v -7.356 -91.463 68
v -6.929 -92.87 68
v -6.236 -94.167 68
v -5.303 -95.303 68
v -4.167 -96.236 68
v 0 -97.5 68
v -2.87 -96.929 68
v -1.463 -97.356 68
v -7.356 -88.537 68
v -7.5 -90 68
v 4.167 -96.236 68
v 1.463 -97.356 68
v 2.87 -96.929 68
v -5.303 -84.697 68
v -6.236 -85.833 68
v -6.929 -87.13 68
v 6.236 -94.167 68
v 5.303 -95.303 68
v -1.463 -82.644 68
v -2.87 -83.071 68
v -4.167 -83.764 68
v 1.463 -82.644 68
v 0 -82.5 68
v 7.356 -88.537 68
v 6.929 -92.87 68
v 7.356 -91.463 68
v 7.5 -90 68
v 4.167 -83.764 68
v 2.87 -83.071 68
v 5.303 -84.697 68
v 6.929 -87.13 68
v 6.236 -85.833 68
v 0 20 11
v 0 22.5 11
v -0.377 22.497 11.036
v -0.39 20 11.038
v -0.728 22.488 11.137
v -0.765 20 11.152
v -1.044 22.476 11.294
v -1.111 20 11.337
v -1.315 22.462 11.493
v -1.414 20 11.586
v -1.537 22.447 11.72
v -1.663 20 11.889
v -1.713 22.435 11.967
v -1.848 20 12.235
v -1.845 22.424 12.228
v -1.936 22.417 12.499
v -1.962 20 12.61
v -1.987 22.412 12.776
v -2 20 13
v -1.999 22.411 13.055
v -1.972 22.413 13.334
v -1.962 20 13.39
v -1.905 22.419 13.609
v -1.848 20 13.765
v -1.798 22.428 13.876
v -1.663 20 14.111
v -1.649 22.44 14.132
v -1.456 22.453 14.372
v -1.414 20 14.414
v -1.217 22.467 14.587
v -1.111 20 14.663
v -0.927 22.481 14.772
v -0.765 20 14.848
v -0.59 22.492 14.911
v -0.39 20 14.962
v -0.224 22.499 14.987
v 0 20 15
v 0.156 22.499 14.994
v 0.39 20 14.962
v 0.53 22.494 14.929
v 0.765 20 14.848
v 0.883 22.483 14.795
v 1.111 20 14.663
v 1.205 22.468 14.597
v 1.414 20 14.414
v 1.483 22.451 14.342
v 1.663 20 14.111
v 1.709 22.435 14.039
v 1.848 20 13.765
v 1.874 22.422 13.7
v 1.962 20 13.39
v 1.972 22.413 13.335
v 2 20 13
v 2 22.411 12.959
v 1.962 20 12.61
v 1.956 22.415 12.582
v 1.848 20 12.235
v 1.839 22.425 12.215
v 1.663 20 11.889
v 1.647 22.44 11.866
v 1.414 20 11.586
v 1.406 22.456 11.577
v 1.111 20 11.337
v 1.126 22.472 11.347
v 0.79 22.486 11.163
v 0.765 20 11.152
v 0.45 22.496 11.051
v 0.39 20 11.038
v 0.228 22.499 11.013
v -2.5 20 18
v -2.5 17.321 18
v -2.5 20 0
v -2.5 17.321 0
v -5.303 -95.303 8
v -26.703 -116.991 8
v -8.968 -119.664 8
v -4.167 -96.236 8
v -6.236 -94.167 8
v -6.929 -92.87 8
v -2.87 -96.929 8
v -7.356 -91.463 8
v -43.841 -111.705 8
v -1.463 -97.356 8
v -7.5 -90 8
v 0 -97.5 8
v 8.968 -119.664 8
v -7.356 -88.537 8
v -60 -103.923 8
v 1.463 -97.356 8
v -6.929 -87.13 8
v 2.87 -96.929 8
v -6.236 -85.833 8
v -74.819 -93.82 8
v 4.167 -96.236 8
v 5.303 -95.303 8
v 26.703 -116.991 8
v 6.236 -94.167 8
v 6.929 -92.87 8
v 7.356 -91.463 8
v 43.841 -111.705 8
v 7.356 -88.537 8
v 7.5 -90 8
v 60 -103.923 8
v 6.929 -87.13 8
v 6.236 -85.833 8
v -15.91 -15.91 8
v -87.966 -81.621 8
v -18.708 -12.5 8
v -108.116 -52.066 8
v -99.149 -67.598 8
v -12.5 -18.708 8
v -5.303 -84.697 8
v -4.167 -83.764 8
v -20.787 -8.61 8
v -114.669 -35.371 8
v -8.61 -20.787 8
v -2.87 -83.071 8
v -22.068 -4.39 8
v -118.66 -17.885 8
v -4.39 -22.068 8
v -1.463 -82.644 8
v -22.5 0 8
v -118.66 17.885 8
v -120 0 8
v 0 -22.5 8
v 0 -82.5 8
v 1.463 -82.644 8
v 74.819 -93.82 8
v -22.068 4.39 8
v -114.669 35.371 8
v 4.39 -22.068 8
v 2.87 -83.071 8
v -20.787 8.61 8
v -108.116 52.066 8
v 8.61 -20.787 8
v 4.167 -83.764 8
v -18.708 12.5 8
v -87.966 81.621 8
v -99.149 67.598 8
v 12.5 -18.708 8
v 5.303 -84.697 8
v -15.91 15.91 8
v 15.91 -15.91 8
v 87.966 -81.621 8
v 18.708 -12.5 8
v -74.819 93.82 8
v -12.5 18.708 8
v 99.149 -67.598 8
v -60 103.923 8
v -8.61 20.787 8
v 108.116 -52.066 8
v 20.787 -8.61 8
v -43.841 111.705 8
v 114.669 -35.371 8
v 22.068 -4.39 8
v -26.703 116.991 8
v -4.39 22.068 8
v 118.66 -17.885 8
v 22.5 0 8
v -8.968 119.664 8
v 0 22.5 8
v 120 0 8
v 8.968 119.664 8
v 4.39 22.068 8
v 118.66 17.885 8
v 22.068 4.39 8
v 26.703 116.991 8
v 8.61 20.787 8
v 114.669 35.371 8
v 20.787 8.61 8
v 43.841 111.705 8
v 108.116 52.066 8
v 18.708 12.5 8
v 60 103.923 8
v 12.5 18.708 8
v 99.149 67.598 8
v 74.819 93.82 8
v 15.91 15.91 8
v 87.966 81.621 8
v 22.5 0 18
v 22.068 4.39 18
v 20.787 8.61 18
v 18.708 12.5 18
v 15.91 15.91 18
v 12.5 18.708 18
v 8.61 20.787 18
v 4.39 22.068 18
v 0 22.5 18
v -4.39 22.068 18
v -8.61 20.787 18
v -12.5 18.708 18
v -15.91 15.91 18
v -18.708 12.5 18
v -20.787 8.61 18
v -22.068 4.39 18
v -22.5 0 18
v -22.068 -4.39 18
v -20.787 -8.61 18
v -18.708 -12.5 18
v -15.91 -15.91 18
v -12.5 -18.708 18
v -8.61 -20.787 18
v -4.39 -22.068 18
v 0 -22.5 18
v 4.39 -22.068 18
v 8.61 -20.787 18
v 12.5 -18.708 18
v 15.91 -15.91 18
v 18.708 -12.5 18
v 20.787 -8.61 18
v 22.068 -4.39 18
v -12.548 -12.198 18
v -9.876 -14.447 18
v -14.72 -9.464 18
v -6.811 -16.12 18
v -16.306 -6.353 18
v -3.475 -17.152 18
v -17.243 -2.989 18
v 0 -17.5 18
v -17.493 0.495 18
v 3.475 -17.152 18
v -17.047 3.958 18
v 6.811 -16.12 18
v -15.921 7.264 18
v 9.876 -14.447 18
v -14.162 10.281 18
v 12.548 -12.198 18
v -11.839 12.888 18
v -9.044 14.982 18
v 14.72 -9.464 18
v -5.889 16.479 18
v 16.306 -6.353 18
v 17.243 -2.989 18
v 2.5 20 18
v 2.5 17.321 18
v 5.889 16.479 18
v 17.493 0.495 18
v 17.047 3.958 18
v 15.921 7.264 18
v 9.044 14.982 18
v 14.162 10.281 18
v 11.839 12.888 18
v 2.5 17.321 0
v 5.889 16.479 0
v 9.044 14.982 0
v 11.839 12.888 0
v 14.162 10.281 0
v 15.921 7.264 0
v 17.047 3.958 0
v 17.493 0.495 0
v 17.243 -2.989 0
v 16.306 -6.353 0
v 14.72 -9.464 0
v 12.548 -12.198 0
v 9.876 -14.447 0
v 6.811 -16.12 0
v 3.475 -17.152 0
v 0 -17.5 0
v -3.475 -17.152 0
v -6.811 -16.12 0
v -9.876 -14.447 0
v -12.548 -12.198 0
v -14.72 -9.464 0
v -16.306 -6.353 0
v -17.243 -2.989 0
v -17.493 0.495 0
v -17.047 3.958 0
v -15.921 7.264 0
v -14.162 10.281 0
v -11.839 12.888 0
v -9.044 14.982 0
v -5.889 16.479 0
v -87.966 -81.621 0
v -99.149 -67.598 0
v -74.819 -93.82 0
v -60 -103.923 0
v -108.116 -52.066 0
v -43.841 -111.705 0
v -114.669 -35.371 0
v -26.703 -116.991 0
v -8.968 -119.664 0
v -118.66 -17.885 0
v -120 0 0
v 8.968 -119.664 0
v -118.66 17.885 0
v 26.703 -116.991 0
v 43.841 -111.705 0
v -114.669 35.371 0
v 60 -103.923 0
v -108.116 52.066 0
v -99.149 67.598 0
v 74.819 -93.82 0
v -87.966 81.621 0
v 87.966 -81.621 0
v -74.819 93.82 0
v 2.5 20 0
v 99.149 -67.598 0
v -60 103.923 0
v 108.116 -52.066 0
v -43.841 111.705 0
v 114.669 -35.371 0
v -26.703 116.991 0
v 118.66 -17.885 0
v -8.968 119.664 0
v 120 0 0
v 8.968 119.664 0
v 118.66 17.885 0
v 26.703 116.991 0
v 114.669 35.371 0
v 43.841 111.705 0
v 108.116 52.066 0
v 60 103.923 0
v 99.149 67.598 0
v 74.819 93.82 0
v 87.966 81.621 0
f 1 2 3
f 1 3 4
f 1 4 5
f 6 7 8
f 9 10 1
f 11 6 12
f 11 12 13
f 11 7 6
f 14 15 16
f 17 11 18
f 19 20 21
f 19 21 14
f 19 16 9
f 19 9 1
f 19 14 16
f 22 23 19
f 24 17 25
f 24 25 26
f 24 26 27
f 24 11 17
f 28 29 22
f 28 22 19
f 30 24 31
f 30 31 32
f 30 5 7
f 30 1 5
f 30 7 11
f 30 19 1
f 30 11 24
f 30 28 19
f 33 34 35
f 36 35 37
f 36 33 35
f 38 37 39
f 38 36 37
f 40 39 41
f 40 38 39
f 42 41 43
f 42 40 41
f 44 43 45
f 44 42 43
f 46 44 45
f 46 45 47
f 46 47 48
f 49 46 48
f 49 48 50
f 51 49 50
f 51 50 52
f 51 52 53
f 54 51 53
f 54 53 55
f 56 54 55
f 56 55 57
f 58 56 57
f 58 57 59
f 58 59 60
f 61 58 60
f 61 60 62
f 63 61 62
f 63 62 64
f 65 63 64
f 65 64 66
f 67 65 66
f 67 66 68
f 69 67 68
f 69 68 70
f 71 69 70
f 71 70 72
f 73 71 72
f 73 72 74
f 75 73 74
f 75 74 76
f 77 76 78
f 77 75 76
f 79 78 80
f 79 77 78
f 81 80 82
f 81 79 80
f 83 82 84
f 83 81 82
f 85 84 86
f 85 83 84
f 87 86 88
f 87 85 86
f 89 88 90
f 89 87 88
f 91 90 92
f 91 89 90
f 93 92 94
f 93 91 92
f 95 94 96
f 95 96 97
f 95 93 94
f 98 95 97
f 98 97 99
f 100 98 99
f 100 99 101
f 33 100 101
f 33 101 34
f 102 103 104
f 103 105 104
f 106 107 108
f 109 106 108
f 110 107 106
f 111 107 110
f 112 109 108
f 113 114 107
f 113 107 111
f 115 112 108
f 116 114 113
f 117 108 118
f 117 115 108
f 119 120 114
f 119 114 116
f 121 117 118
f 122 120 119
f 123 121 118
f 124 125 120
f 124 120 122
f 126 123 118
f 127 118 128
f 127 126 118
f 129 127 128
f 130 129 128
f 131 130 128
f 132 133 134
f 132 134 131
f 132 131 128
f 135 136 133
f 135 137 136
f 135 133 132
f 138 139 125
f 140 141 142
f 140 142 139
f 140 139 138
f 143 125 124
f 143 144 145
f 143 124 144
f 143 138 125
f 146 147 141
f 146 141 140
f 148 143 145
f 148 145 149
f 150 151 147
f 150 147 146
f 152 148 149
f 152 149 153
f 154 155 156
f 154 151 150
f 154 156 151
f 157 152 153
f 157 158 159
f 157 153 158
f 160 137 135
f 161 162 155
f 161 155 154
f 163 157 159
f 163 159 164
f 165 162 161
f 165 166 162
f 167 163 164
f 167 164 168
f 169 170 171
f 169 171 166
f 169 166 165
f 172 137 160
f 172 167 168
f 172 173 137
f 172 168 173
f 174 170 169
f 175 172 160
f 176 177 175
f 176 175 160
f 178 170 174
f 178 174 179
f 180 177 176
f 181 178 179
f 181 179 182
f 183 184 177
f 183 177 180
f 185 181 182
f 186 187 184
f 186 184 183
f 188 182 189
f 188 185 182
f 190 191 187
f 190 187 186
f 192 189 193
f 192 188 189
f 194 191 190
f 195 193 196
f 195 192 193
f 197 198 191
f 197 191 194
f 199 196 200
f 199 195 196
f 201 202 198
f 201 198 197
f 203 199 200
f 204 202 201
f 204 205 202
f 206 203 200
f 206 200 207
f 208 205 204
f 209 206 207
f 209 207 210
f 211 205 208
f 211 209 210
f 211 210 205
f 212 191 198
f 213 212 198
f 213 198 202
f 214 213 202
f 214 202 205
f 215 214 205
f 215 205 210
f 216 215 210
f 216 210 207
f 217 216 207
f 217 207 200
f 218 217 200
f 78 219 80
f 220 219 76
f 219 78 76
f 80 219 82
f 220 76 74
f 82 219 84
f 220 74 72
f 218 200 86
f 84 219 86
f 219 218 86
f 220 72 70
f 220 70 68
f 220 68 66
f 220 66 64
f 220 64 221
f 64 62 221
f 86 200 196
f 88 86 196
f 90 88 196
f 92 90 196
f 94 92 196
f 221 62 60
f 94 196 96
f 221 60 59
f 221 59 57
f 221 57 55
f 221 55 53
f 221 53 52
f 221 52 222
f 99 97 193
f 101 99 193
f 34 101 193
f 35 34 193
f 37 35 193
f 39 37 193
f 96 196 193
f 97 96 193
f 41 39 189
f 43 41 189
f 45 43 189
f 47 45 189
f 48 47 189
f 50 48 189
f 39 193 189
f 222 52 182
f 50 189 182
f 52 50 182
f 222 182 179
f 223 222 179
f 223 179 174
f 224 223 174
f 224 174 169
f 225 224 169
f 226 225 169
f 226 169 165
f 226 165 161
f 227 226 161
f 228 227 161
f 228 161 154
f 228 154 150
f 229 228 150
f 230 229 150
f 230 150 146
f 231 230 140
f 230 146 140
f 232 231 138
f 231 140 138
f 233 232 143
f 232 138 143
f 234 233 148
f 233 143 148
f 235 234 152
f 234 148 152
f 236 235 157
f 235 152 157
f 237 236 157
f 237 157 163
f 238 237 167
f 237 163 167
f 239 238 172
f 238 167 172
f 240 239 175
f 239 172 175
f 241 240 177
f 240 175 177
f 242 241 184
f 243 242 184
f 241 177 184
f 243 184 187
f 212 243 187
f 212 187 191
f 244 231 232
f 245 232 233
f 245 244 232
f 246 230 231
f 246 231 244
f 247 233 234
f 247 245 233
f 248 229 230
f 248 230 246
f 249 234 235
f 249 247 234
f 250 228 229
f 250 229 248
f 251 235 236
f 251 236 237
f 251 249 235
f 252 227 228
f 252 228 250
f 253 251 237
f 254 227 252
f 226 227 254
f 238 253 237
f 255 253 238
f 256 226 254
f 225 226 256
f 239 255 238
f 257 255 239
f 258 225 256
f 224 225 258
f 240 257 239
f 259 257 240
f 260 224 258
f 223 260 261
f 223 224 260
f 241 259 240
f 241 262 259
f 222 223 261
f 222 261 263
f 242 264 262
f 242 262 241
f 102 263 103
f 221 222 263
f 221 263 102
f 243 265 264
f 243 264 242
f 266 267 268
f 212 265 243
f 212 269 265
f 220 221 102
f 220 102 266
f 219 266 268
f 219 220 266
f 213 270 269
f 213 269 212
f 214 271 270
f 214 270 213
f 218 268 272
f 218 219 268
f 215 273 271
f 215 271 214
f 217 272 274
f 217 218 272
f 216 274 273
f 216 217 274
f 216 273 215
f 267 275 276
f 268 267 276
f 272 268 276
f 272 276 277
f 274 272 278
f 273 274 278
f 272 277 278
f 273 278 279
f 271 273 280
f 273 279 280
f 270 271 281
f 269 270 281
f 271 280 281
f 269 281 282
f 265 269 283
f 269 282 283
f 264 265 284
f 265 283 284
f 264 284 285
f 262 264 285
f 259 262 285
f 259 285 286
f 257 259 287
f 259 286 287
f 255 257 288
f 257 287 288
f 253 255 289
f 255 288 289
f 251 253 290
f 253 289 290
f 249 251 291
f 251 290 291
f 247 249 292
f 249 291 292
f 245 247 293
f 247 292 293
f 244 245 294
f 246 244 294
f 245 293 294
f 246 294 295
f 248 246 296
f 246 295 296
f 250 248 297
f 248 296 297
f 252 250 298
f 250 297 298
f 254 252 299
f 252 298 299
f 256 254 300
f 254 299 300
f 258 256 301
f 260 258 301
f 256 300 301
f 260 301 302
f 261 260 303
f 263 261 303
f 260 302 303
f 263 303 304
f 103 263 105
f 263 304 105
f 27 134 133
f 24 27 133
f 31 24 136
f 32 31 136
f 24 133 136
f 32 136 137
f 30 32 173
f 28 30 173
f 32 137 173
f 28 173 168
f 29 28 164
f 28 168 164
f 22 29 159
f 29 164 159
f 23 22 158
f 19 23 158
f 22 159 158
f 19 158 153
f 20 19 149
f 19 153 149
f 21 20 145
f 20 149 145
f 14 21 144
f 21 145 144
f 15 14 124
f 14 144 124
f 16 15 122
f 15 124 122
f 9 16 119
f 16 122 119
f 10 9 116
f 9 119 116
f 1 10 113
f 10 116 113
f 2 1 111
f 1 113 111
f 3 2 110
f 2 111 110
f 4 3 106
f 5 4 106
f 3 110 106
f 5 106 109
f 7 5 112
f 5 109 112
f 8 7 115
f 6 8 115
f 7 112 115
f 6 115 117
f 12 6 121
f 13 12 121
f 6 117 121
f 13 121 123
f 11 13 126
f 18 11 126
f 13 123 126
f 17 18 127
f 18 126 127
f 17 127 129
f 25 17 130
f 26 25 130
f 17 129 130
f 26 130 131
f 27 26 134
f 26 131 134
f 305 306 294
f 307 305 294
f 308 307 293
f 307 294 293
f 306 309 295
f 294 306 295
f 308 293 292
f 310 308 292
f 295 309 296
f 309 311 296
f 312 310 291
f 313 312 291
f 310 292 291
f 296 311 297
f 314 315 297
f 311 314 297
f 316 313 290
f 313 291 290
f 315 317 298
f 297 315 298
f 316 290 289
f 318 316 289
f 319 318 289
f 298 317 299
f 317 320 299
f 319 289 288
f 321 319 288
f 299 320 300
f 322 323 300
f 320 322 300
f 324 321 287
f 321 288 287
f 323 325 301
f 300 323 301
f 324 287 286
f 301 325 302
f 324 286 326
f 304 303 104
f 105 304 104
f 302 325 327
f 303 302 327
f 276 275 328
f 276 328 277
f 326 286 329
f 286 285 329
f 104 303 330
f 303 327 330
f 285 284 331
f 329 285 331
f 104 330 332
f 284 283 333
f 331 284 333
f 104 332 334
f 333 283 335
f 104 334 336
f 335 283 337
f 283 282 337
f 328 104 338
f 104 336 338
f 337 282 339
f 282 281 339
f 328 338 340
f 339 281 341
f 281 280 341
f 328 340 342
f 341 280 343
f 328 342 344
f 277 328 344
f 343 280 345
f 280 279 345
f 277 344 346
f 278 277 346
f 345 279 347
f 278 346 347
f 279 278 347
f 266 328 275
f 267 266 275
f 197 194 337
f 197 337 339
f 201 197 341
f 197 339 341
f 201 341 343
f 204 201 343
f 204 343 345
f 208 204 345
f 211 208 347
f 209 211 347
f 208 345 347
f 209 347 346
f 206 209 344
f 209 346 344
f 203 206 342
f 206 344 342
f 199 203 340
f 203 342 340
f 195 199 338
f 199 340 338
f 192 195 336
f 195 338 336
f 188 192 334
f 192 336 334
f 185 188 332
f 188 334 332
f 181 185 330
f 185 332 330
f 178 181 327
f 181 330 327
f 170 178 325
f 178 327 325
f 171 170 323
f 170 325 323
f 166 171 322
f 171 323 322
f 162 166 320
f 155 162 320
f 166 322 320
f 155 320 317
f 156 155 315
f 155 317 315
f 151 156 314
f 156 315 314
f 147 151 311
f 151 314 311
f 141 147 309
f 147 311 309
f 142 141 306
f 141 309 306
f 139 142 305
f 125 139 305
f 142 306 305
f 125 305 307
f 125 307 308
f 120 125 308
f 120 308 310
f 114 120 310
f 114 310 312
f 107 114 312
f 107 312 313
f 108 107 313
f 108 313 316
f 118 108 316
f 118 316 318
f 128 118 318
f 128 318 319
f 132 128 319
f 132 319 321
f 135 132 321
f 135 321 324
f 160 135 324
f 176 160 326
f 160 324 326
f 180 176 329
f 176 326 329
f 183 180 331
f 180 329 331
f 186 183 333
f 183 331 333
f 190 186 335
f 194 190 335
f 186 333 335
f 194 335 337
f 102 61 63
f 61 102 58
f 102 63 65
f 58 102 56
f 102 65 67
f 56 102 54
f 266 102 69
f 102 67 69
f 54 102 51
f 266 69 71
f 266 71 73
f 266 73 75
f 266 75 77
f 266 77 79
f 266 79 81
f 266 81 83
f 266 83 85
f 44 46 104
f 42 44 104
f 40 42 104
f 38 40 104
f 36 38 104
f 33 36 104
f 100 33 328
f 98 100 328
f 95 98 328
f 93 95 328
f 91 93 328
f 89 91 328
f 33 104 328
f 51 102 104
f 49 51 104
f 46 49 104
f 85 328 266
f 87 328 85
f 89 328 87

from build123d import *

# Parameters (mm, degrees)
SKETCH1_R           = 120
BOSS_EXTRUDE1_DEPTH = 8
SKETCH2_R           = 22.5
BOSS_EXTRUDE2_DEPTH = 10
SKETCH3_R           = 2
CUT_EXTRUDE1_DEPTH  = 25
SKETCH4_R           = 7.5
BOSS_EXTRUDE3_DEPTH = 60


with BuildPart() as part:
    # Sketch1 → Boss-Extrude1 (new body)
    with BuildSketch(Plane.XY):
        Circle(SKETCH1_R)
        with BuildLine():
            Line((-2.5, 20), (2.5, 20))
            Line((2.5, 20), (2.5, 17.320508076))
            ThreePointArc((2.5, 17.320508076), (0, -17.5), (-2.5, 17.320508076))
            Line((-2.5, 17.320508076), (-2.5, 20))
        make_face(mode=Mode.SUBTRACT)
    extrude(amount=BOSS_EXTRUDE1_DEPTH)

    # Sketch2 → Boss-Extrude2 (add)
    with BuildSketch(Plane.XY.offset(8)):
        Circle(SKETCH2_R)
        with BuildLine():
            Line((-2.5, 17.320508076), (-2.5, 20))
            Line((-2.5, 20), (2.5, 20))
            Line((2.5, 20), (2.5, 17.320508076))
            ThreePointArc((2.5, 17.320508076), (0, -17.5), (-2.5, 17.320508076))
        make_face(mode=Mode.SUBTRACT)
    extrude(amount=BOSS_EXTRUDE2_DEPTH)

    # Sketch3 → Cut-Extrude1 (cut)
    with BuildSketch(Plane(origin=(0, 0, 0), x_dir=(1, 0, 0), z_dir=(0, 1, 0))):
        with Locations(Location((0, -13, 0), (0, 0, 90))):
            Circle(SKETCH3_R)
    extrude(amount=CUT_EXTRUDE1_DEPTH, mode=Mode.SUBTRACT)

    # Sketch4 → Boss-Extrude3 (add)
    with BuildSketch(Plane.XY.offset(8)):
        with Locations((0, -90)):
            Circle(SKETCH4_R)
    extrude(amount=BOSS_EXTRUDE3_DEPTH)


solid = part.part
